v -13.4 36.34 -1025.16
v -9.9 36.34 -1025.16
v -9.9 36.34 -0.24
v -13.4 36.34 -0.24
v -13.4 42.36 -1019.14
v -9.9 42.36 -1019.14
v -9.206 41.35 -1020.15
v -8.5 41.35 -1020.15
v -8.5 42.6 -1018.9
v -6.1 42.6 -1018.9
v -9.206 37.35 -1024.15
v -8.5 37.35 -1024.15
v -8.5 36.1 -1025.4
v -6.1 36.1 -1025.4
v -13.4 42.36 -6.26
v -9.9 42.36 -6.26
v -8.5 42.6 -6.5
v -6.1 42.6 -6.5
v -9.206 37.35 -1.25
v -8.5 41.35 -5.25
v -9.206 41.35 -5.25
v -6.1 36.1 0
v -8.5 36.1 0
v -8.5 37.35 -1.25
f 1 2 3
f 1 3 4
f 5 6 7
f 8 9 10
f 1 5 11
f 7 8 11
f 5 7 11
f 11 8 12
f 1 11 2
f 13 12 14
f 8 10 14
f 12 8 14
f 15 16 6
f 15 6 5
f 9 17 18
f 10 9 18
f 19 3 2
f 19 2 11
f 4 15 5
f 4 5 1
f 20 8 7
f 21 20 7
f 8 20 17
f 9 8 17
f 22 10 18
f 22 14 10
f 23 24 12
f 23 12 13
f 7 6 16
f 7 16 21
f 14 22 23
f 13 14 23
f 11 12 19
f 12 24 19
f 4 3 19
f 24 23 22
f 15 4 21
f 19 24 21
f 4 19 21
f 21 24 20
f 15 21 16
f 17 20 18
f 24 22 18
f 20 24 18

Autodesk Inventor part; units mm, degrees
ref_plane "YZ Plane" through (0, 0, 0) normal (1, 0, 0) x (0, 1, 0)
ref_plane "XZ Plane" through (0, 0, 0) normal (0, 1, 0) x (-1, 0, 0)
ref_plane "XY Plane" through (0, 0, 0) normal (0, 0, 1) x (1, 0, 0)
sketch "Sketch1" plane through (0, 0, 0) normal (0, 0, 1) x (1, 0, 0)
  line L0 (-8.5, 42.6) -> (-6.1, 42.6)
  line L1 (-6.1, 36.1) -> (-8.5, 36.1)
  line L2 (-6.1, 36.1) -> (-6.1, 42.6)
  line L3 (-8.5, 37.35) -> (-8.5, 36.1)
  line L4 (-8.5, 41.35) -> (-8.5, 42.6)
  line L5 (-8.5, 37.35) -> (-9.2058, 37.35)
  line L6 (-8.5, 41.35) -> (-9.2058, 41.35)
  line L7 (-9.9, 42.36) -> (-9.2058, 41.35)
  line L8 (-9.9, 36.34) -> (-9.2058, 37.35)
  line L9 (-9.9, 36.34) -> (-13.4, 36.34)
  line L10 (-9.9, 42.36) -> (-13.4, 42.36)
  line L11 (-13.4, 42.36) -> (-13.4, 36.34)
  point P0 (-8.5, 41.975)
  point P1 (-6.1, 39.35)
  dimension "d27" = 6.5
  dimension "d28" = 2.4
  dimension "d29" = 2.4
  dimension "d35" = 111
  dimension "d36" = 4
  dimension "d37" = 6.02
  dimension "d38" = 0.7058
  dimension "d39" = 0.7058
  dimension "d43" = 3.01
  dimension "d44" = 2
  dimension "d63" = 3.5
  dimension "d64" = 3.5
extrude "Extrusion1" add sketch "Sketch1" against normal blind 1025.4
ref_plane "Plano de trabajo3" through (0, 0, -512.7) normal (0, 0, 1) x (1, 0, 0)
sketch "Boceto2" plane through (-6.1, 36.1, 0) normal (1, 0, 0) x (0, 0, -1)
  line L0 (0, 0) -> (6.5, 6.5)
  line L1 (0, 6.5) -> (1025.4, 6.5) projected
  line L2 (6.5, 6.5) -> (0, 6.5)
  line L3 (6.5, 6.5) -> (0, 6.5)
  line L4 (0, 6.5) -> (0, 0)
  point P0 (0, -36.1)
  dimension "d65" = 45
extrude "Extrusión3" cut sketch "Boceto2" against normal through all
mirror "Simetría3" about plane through (0, 0, -512.7) normal (0, 0, 1) of "Extrusión3"
properties part number "SP40-10 JUNTA INT 1026.2 mm" material "Rubber"
